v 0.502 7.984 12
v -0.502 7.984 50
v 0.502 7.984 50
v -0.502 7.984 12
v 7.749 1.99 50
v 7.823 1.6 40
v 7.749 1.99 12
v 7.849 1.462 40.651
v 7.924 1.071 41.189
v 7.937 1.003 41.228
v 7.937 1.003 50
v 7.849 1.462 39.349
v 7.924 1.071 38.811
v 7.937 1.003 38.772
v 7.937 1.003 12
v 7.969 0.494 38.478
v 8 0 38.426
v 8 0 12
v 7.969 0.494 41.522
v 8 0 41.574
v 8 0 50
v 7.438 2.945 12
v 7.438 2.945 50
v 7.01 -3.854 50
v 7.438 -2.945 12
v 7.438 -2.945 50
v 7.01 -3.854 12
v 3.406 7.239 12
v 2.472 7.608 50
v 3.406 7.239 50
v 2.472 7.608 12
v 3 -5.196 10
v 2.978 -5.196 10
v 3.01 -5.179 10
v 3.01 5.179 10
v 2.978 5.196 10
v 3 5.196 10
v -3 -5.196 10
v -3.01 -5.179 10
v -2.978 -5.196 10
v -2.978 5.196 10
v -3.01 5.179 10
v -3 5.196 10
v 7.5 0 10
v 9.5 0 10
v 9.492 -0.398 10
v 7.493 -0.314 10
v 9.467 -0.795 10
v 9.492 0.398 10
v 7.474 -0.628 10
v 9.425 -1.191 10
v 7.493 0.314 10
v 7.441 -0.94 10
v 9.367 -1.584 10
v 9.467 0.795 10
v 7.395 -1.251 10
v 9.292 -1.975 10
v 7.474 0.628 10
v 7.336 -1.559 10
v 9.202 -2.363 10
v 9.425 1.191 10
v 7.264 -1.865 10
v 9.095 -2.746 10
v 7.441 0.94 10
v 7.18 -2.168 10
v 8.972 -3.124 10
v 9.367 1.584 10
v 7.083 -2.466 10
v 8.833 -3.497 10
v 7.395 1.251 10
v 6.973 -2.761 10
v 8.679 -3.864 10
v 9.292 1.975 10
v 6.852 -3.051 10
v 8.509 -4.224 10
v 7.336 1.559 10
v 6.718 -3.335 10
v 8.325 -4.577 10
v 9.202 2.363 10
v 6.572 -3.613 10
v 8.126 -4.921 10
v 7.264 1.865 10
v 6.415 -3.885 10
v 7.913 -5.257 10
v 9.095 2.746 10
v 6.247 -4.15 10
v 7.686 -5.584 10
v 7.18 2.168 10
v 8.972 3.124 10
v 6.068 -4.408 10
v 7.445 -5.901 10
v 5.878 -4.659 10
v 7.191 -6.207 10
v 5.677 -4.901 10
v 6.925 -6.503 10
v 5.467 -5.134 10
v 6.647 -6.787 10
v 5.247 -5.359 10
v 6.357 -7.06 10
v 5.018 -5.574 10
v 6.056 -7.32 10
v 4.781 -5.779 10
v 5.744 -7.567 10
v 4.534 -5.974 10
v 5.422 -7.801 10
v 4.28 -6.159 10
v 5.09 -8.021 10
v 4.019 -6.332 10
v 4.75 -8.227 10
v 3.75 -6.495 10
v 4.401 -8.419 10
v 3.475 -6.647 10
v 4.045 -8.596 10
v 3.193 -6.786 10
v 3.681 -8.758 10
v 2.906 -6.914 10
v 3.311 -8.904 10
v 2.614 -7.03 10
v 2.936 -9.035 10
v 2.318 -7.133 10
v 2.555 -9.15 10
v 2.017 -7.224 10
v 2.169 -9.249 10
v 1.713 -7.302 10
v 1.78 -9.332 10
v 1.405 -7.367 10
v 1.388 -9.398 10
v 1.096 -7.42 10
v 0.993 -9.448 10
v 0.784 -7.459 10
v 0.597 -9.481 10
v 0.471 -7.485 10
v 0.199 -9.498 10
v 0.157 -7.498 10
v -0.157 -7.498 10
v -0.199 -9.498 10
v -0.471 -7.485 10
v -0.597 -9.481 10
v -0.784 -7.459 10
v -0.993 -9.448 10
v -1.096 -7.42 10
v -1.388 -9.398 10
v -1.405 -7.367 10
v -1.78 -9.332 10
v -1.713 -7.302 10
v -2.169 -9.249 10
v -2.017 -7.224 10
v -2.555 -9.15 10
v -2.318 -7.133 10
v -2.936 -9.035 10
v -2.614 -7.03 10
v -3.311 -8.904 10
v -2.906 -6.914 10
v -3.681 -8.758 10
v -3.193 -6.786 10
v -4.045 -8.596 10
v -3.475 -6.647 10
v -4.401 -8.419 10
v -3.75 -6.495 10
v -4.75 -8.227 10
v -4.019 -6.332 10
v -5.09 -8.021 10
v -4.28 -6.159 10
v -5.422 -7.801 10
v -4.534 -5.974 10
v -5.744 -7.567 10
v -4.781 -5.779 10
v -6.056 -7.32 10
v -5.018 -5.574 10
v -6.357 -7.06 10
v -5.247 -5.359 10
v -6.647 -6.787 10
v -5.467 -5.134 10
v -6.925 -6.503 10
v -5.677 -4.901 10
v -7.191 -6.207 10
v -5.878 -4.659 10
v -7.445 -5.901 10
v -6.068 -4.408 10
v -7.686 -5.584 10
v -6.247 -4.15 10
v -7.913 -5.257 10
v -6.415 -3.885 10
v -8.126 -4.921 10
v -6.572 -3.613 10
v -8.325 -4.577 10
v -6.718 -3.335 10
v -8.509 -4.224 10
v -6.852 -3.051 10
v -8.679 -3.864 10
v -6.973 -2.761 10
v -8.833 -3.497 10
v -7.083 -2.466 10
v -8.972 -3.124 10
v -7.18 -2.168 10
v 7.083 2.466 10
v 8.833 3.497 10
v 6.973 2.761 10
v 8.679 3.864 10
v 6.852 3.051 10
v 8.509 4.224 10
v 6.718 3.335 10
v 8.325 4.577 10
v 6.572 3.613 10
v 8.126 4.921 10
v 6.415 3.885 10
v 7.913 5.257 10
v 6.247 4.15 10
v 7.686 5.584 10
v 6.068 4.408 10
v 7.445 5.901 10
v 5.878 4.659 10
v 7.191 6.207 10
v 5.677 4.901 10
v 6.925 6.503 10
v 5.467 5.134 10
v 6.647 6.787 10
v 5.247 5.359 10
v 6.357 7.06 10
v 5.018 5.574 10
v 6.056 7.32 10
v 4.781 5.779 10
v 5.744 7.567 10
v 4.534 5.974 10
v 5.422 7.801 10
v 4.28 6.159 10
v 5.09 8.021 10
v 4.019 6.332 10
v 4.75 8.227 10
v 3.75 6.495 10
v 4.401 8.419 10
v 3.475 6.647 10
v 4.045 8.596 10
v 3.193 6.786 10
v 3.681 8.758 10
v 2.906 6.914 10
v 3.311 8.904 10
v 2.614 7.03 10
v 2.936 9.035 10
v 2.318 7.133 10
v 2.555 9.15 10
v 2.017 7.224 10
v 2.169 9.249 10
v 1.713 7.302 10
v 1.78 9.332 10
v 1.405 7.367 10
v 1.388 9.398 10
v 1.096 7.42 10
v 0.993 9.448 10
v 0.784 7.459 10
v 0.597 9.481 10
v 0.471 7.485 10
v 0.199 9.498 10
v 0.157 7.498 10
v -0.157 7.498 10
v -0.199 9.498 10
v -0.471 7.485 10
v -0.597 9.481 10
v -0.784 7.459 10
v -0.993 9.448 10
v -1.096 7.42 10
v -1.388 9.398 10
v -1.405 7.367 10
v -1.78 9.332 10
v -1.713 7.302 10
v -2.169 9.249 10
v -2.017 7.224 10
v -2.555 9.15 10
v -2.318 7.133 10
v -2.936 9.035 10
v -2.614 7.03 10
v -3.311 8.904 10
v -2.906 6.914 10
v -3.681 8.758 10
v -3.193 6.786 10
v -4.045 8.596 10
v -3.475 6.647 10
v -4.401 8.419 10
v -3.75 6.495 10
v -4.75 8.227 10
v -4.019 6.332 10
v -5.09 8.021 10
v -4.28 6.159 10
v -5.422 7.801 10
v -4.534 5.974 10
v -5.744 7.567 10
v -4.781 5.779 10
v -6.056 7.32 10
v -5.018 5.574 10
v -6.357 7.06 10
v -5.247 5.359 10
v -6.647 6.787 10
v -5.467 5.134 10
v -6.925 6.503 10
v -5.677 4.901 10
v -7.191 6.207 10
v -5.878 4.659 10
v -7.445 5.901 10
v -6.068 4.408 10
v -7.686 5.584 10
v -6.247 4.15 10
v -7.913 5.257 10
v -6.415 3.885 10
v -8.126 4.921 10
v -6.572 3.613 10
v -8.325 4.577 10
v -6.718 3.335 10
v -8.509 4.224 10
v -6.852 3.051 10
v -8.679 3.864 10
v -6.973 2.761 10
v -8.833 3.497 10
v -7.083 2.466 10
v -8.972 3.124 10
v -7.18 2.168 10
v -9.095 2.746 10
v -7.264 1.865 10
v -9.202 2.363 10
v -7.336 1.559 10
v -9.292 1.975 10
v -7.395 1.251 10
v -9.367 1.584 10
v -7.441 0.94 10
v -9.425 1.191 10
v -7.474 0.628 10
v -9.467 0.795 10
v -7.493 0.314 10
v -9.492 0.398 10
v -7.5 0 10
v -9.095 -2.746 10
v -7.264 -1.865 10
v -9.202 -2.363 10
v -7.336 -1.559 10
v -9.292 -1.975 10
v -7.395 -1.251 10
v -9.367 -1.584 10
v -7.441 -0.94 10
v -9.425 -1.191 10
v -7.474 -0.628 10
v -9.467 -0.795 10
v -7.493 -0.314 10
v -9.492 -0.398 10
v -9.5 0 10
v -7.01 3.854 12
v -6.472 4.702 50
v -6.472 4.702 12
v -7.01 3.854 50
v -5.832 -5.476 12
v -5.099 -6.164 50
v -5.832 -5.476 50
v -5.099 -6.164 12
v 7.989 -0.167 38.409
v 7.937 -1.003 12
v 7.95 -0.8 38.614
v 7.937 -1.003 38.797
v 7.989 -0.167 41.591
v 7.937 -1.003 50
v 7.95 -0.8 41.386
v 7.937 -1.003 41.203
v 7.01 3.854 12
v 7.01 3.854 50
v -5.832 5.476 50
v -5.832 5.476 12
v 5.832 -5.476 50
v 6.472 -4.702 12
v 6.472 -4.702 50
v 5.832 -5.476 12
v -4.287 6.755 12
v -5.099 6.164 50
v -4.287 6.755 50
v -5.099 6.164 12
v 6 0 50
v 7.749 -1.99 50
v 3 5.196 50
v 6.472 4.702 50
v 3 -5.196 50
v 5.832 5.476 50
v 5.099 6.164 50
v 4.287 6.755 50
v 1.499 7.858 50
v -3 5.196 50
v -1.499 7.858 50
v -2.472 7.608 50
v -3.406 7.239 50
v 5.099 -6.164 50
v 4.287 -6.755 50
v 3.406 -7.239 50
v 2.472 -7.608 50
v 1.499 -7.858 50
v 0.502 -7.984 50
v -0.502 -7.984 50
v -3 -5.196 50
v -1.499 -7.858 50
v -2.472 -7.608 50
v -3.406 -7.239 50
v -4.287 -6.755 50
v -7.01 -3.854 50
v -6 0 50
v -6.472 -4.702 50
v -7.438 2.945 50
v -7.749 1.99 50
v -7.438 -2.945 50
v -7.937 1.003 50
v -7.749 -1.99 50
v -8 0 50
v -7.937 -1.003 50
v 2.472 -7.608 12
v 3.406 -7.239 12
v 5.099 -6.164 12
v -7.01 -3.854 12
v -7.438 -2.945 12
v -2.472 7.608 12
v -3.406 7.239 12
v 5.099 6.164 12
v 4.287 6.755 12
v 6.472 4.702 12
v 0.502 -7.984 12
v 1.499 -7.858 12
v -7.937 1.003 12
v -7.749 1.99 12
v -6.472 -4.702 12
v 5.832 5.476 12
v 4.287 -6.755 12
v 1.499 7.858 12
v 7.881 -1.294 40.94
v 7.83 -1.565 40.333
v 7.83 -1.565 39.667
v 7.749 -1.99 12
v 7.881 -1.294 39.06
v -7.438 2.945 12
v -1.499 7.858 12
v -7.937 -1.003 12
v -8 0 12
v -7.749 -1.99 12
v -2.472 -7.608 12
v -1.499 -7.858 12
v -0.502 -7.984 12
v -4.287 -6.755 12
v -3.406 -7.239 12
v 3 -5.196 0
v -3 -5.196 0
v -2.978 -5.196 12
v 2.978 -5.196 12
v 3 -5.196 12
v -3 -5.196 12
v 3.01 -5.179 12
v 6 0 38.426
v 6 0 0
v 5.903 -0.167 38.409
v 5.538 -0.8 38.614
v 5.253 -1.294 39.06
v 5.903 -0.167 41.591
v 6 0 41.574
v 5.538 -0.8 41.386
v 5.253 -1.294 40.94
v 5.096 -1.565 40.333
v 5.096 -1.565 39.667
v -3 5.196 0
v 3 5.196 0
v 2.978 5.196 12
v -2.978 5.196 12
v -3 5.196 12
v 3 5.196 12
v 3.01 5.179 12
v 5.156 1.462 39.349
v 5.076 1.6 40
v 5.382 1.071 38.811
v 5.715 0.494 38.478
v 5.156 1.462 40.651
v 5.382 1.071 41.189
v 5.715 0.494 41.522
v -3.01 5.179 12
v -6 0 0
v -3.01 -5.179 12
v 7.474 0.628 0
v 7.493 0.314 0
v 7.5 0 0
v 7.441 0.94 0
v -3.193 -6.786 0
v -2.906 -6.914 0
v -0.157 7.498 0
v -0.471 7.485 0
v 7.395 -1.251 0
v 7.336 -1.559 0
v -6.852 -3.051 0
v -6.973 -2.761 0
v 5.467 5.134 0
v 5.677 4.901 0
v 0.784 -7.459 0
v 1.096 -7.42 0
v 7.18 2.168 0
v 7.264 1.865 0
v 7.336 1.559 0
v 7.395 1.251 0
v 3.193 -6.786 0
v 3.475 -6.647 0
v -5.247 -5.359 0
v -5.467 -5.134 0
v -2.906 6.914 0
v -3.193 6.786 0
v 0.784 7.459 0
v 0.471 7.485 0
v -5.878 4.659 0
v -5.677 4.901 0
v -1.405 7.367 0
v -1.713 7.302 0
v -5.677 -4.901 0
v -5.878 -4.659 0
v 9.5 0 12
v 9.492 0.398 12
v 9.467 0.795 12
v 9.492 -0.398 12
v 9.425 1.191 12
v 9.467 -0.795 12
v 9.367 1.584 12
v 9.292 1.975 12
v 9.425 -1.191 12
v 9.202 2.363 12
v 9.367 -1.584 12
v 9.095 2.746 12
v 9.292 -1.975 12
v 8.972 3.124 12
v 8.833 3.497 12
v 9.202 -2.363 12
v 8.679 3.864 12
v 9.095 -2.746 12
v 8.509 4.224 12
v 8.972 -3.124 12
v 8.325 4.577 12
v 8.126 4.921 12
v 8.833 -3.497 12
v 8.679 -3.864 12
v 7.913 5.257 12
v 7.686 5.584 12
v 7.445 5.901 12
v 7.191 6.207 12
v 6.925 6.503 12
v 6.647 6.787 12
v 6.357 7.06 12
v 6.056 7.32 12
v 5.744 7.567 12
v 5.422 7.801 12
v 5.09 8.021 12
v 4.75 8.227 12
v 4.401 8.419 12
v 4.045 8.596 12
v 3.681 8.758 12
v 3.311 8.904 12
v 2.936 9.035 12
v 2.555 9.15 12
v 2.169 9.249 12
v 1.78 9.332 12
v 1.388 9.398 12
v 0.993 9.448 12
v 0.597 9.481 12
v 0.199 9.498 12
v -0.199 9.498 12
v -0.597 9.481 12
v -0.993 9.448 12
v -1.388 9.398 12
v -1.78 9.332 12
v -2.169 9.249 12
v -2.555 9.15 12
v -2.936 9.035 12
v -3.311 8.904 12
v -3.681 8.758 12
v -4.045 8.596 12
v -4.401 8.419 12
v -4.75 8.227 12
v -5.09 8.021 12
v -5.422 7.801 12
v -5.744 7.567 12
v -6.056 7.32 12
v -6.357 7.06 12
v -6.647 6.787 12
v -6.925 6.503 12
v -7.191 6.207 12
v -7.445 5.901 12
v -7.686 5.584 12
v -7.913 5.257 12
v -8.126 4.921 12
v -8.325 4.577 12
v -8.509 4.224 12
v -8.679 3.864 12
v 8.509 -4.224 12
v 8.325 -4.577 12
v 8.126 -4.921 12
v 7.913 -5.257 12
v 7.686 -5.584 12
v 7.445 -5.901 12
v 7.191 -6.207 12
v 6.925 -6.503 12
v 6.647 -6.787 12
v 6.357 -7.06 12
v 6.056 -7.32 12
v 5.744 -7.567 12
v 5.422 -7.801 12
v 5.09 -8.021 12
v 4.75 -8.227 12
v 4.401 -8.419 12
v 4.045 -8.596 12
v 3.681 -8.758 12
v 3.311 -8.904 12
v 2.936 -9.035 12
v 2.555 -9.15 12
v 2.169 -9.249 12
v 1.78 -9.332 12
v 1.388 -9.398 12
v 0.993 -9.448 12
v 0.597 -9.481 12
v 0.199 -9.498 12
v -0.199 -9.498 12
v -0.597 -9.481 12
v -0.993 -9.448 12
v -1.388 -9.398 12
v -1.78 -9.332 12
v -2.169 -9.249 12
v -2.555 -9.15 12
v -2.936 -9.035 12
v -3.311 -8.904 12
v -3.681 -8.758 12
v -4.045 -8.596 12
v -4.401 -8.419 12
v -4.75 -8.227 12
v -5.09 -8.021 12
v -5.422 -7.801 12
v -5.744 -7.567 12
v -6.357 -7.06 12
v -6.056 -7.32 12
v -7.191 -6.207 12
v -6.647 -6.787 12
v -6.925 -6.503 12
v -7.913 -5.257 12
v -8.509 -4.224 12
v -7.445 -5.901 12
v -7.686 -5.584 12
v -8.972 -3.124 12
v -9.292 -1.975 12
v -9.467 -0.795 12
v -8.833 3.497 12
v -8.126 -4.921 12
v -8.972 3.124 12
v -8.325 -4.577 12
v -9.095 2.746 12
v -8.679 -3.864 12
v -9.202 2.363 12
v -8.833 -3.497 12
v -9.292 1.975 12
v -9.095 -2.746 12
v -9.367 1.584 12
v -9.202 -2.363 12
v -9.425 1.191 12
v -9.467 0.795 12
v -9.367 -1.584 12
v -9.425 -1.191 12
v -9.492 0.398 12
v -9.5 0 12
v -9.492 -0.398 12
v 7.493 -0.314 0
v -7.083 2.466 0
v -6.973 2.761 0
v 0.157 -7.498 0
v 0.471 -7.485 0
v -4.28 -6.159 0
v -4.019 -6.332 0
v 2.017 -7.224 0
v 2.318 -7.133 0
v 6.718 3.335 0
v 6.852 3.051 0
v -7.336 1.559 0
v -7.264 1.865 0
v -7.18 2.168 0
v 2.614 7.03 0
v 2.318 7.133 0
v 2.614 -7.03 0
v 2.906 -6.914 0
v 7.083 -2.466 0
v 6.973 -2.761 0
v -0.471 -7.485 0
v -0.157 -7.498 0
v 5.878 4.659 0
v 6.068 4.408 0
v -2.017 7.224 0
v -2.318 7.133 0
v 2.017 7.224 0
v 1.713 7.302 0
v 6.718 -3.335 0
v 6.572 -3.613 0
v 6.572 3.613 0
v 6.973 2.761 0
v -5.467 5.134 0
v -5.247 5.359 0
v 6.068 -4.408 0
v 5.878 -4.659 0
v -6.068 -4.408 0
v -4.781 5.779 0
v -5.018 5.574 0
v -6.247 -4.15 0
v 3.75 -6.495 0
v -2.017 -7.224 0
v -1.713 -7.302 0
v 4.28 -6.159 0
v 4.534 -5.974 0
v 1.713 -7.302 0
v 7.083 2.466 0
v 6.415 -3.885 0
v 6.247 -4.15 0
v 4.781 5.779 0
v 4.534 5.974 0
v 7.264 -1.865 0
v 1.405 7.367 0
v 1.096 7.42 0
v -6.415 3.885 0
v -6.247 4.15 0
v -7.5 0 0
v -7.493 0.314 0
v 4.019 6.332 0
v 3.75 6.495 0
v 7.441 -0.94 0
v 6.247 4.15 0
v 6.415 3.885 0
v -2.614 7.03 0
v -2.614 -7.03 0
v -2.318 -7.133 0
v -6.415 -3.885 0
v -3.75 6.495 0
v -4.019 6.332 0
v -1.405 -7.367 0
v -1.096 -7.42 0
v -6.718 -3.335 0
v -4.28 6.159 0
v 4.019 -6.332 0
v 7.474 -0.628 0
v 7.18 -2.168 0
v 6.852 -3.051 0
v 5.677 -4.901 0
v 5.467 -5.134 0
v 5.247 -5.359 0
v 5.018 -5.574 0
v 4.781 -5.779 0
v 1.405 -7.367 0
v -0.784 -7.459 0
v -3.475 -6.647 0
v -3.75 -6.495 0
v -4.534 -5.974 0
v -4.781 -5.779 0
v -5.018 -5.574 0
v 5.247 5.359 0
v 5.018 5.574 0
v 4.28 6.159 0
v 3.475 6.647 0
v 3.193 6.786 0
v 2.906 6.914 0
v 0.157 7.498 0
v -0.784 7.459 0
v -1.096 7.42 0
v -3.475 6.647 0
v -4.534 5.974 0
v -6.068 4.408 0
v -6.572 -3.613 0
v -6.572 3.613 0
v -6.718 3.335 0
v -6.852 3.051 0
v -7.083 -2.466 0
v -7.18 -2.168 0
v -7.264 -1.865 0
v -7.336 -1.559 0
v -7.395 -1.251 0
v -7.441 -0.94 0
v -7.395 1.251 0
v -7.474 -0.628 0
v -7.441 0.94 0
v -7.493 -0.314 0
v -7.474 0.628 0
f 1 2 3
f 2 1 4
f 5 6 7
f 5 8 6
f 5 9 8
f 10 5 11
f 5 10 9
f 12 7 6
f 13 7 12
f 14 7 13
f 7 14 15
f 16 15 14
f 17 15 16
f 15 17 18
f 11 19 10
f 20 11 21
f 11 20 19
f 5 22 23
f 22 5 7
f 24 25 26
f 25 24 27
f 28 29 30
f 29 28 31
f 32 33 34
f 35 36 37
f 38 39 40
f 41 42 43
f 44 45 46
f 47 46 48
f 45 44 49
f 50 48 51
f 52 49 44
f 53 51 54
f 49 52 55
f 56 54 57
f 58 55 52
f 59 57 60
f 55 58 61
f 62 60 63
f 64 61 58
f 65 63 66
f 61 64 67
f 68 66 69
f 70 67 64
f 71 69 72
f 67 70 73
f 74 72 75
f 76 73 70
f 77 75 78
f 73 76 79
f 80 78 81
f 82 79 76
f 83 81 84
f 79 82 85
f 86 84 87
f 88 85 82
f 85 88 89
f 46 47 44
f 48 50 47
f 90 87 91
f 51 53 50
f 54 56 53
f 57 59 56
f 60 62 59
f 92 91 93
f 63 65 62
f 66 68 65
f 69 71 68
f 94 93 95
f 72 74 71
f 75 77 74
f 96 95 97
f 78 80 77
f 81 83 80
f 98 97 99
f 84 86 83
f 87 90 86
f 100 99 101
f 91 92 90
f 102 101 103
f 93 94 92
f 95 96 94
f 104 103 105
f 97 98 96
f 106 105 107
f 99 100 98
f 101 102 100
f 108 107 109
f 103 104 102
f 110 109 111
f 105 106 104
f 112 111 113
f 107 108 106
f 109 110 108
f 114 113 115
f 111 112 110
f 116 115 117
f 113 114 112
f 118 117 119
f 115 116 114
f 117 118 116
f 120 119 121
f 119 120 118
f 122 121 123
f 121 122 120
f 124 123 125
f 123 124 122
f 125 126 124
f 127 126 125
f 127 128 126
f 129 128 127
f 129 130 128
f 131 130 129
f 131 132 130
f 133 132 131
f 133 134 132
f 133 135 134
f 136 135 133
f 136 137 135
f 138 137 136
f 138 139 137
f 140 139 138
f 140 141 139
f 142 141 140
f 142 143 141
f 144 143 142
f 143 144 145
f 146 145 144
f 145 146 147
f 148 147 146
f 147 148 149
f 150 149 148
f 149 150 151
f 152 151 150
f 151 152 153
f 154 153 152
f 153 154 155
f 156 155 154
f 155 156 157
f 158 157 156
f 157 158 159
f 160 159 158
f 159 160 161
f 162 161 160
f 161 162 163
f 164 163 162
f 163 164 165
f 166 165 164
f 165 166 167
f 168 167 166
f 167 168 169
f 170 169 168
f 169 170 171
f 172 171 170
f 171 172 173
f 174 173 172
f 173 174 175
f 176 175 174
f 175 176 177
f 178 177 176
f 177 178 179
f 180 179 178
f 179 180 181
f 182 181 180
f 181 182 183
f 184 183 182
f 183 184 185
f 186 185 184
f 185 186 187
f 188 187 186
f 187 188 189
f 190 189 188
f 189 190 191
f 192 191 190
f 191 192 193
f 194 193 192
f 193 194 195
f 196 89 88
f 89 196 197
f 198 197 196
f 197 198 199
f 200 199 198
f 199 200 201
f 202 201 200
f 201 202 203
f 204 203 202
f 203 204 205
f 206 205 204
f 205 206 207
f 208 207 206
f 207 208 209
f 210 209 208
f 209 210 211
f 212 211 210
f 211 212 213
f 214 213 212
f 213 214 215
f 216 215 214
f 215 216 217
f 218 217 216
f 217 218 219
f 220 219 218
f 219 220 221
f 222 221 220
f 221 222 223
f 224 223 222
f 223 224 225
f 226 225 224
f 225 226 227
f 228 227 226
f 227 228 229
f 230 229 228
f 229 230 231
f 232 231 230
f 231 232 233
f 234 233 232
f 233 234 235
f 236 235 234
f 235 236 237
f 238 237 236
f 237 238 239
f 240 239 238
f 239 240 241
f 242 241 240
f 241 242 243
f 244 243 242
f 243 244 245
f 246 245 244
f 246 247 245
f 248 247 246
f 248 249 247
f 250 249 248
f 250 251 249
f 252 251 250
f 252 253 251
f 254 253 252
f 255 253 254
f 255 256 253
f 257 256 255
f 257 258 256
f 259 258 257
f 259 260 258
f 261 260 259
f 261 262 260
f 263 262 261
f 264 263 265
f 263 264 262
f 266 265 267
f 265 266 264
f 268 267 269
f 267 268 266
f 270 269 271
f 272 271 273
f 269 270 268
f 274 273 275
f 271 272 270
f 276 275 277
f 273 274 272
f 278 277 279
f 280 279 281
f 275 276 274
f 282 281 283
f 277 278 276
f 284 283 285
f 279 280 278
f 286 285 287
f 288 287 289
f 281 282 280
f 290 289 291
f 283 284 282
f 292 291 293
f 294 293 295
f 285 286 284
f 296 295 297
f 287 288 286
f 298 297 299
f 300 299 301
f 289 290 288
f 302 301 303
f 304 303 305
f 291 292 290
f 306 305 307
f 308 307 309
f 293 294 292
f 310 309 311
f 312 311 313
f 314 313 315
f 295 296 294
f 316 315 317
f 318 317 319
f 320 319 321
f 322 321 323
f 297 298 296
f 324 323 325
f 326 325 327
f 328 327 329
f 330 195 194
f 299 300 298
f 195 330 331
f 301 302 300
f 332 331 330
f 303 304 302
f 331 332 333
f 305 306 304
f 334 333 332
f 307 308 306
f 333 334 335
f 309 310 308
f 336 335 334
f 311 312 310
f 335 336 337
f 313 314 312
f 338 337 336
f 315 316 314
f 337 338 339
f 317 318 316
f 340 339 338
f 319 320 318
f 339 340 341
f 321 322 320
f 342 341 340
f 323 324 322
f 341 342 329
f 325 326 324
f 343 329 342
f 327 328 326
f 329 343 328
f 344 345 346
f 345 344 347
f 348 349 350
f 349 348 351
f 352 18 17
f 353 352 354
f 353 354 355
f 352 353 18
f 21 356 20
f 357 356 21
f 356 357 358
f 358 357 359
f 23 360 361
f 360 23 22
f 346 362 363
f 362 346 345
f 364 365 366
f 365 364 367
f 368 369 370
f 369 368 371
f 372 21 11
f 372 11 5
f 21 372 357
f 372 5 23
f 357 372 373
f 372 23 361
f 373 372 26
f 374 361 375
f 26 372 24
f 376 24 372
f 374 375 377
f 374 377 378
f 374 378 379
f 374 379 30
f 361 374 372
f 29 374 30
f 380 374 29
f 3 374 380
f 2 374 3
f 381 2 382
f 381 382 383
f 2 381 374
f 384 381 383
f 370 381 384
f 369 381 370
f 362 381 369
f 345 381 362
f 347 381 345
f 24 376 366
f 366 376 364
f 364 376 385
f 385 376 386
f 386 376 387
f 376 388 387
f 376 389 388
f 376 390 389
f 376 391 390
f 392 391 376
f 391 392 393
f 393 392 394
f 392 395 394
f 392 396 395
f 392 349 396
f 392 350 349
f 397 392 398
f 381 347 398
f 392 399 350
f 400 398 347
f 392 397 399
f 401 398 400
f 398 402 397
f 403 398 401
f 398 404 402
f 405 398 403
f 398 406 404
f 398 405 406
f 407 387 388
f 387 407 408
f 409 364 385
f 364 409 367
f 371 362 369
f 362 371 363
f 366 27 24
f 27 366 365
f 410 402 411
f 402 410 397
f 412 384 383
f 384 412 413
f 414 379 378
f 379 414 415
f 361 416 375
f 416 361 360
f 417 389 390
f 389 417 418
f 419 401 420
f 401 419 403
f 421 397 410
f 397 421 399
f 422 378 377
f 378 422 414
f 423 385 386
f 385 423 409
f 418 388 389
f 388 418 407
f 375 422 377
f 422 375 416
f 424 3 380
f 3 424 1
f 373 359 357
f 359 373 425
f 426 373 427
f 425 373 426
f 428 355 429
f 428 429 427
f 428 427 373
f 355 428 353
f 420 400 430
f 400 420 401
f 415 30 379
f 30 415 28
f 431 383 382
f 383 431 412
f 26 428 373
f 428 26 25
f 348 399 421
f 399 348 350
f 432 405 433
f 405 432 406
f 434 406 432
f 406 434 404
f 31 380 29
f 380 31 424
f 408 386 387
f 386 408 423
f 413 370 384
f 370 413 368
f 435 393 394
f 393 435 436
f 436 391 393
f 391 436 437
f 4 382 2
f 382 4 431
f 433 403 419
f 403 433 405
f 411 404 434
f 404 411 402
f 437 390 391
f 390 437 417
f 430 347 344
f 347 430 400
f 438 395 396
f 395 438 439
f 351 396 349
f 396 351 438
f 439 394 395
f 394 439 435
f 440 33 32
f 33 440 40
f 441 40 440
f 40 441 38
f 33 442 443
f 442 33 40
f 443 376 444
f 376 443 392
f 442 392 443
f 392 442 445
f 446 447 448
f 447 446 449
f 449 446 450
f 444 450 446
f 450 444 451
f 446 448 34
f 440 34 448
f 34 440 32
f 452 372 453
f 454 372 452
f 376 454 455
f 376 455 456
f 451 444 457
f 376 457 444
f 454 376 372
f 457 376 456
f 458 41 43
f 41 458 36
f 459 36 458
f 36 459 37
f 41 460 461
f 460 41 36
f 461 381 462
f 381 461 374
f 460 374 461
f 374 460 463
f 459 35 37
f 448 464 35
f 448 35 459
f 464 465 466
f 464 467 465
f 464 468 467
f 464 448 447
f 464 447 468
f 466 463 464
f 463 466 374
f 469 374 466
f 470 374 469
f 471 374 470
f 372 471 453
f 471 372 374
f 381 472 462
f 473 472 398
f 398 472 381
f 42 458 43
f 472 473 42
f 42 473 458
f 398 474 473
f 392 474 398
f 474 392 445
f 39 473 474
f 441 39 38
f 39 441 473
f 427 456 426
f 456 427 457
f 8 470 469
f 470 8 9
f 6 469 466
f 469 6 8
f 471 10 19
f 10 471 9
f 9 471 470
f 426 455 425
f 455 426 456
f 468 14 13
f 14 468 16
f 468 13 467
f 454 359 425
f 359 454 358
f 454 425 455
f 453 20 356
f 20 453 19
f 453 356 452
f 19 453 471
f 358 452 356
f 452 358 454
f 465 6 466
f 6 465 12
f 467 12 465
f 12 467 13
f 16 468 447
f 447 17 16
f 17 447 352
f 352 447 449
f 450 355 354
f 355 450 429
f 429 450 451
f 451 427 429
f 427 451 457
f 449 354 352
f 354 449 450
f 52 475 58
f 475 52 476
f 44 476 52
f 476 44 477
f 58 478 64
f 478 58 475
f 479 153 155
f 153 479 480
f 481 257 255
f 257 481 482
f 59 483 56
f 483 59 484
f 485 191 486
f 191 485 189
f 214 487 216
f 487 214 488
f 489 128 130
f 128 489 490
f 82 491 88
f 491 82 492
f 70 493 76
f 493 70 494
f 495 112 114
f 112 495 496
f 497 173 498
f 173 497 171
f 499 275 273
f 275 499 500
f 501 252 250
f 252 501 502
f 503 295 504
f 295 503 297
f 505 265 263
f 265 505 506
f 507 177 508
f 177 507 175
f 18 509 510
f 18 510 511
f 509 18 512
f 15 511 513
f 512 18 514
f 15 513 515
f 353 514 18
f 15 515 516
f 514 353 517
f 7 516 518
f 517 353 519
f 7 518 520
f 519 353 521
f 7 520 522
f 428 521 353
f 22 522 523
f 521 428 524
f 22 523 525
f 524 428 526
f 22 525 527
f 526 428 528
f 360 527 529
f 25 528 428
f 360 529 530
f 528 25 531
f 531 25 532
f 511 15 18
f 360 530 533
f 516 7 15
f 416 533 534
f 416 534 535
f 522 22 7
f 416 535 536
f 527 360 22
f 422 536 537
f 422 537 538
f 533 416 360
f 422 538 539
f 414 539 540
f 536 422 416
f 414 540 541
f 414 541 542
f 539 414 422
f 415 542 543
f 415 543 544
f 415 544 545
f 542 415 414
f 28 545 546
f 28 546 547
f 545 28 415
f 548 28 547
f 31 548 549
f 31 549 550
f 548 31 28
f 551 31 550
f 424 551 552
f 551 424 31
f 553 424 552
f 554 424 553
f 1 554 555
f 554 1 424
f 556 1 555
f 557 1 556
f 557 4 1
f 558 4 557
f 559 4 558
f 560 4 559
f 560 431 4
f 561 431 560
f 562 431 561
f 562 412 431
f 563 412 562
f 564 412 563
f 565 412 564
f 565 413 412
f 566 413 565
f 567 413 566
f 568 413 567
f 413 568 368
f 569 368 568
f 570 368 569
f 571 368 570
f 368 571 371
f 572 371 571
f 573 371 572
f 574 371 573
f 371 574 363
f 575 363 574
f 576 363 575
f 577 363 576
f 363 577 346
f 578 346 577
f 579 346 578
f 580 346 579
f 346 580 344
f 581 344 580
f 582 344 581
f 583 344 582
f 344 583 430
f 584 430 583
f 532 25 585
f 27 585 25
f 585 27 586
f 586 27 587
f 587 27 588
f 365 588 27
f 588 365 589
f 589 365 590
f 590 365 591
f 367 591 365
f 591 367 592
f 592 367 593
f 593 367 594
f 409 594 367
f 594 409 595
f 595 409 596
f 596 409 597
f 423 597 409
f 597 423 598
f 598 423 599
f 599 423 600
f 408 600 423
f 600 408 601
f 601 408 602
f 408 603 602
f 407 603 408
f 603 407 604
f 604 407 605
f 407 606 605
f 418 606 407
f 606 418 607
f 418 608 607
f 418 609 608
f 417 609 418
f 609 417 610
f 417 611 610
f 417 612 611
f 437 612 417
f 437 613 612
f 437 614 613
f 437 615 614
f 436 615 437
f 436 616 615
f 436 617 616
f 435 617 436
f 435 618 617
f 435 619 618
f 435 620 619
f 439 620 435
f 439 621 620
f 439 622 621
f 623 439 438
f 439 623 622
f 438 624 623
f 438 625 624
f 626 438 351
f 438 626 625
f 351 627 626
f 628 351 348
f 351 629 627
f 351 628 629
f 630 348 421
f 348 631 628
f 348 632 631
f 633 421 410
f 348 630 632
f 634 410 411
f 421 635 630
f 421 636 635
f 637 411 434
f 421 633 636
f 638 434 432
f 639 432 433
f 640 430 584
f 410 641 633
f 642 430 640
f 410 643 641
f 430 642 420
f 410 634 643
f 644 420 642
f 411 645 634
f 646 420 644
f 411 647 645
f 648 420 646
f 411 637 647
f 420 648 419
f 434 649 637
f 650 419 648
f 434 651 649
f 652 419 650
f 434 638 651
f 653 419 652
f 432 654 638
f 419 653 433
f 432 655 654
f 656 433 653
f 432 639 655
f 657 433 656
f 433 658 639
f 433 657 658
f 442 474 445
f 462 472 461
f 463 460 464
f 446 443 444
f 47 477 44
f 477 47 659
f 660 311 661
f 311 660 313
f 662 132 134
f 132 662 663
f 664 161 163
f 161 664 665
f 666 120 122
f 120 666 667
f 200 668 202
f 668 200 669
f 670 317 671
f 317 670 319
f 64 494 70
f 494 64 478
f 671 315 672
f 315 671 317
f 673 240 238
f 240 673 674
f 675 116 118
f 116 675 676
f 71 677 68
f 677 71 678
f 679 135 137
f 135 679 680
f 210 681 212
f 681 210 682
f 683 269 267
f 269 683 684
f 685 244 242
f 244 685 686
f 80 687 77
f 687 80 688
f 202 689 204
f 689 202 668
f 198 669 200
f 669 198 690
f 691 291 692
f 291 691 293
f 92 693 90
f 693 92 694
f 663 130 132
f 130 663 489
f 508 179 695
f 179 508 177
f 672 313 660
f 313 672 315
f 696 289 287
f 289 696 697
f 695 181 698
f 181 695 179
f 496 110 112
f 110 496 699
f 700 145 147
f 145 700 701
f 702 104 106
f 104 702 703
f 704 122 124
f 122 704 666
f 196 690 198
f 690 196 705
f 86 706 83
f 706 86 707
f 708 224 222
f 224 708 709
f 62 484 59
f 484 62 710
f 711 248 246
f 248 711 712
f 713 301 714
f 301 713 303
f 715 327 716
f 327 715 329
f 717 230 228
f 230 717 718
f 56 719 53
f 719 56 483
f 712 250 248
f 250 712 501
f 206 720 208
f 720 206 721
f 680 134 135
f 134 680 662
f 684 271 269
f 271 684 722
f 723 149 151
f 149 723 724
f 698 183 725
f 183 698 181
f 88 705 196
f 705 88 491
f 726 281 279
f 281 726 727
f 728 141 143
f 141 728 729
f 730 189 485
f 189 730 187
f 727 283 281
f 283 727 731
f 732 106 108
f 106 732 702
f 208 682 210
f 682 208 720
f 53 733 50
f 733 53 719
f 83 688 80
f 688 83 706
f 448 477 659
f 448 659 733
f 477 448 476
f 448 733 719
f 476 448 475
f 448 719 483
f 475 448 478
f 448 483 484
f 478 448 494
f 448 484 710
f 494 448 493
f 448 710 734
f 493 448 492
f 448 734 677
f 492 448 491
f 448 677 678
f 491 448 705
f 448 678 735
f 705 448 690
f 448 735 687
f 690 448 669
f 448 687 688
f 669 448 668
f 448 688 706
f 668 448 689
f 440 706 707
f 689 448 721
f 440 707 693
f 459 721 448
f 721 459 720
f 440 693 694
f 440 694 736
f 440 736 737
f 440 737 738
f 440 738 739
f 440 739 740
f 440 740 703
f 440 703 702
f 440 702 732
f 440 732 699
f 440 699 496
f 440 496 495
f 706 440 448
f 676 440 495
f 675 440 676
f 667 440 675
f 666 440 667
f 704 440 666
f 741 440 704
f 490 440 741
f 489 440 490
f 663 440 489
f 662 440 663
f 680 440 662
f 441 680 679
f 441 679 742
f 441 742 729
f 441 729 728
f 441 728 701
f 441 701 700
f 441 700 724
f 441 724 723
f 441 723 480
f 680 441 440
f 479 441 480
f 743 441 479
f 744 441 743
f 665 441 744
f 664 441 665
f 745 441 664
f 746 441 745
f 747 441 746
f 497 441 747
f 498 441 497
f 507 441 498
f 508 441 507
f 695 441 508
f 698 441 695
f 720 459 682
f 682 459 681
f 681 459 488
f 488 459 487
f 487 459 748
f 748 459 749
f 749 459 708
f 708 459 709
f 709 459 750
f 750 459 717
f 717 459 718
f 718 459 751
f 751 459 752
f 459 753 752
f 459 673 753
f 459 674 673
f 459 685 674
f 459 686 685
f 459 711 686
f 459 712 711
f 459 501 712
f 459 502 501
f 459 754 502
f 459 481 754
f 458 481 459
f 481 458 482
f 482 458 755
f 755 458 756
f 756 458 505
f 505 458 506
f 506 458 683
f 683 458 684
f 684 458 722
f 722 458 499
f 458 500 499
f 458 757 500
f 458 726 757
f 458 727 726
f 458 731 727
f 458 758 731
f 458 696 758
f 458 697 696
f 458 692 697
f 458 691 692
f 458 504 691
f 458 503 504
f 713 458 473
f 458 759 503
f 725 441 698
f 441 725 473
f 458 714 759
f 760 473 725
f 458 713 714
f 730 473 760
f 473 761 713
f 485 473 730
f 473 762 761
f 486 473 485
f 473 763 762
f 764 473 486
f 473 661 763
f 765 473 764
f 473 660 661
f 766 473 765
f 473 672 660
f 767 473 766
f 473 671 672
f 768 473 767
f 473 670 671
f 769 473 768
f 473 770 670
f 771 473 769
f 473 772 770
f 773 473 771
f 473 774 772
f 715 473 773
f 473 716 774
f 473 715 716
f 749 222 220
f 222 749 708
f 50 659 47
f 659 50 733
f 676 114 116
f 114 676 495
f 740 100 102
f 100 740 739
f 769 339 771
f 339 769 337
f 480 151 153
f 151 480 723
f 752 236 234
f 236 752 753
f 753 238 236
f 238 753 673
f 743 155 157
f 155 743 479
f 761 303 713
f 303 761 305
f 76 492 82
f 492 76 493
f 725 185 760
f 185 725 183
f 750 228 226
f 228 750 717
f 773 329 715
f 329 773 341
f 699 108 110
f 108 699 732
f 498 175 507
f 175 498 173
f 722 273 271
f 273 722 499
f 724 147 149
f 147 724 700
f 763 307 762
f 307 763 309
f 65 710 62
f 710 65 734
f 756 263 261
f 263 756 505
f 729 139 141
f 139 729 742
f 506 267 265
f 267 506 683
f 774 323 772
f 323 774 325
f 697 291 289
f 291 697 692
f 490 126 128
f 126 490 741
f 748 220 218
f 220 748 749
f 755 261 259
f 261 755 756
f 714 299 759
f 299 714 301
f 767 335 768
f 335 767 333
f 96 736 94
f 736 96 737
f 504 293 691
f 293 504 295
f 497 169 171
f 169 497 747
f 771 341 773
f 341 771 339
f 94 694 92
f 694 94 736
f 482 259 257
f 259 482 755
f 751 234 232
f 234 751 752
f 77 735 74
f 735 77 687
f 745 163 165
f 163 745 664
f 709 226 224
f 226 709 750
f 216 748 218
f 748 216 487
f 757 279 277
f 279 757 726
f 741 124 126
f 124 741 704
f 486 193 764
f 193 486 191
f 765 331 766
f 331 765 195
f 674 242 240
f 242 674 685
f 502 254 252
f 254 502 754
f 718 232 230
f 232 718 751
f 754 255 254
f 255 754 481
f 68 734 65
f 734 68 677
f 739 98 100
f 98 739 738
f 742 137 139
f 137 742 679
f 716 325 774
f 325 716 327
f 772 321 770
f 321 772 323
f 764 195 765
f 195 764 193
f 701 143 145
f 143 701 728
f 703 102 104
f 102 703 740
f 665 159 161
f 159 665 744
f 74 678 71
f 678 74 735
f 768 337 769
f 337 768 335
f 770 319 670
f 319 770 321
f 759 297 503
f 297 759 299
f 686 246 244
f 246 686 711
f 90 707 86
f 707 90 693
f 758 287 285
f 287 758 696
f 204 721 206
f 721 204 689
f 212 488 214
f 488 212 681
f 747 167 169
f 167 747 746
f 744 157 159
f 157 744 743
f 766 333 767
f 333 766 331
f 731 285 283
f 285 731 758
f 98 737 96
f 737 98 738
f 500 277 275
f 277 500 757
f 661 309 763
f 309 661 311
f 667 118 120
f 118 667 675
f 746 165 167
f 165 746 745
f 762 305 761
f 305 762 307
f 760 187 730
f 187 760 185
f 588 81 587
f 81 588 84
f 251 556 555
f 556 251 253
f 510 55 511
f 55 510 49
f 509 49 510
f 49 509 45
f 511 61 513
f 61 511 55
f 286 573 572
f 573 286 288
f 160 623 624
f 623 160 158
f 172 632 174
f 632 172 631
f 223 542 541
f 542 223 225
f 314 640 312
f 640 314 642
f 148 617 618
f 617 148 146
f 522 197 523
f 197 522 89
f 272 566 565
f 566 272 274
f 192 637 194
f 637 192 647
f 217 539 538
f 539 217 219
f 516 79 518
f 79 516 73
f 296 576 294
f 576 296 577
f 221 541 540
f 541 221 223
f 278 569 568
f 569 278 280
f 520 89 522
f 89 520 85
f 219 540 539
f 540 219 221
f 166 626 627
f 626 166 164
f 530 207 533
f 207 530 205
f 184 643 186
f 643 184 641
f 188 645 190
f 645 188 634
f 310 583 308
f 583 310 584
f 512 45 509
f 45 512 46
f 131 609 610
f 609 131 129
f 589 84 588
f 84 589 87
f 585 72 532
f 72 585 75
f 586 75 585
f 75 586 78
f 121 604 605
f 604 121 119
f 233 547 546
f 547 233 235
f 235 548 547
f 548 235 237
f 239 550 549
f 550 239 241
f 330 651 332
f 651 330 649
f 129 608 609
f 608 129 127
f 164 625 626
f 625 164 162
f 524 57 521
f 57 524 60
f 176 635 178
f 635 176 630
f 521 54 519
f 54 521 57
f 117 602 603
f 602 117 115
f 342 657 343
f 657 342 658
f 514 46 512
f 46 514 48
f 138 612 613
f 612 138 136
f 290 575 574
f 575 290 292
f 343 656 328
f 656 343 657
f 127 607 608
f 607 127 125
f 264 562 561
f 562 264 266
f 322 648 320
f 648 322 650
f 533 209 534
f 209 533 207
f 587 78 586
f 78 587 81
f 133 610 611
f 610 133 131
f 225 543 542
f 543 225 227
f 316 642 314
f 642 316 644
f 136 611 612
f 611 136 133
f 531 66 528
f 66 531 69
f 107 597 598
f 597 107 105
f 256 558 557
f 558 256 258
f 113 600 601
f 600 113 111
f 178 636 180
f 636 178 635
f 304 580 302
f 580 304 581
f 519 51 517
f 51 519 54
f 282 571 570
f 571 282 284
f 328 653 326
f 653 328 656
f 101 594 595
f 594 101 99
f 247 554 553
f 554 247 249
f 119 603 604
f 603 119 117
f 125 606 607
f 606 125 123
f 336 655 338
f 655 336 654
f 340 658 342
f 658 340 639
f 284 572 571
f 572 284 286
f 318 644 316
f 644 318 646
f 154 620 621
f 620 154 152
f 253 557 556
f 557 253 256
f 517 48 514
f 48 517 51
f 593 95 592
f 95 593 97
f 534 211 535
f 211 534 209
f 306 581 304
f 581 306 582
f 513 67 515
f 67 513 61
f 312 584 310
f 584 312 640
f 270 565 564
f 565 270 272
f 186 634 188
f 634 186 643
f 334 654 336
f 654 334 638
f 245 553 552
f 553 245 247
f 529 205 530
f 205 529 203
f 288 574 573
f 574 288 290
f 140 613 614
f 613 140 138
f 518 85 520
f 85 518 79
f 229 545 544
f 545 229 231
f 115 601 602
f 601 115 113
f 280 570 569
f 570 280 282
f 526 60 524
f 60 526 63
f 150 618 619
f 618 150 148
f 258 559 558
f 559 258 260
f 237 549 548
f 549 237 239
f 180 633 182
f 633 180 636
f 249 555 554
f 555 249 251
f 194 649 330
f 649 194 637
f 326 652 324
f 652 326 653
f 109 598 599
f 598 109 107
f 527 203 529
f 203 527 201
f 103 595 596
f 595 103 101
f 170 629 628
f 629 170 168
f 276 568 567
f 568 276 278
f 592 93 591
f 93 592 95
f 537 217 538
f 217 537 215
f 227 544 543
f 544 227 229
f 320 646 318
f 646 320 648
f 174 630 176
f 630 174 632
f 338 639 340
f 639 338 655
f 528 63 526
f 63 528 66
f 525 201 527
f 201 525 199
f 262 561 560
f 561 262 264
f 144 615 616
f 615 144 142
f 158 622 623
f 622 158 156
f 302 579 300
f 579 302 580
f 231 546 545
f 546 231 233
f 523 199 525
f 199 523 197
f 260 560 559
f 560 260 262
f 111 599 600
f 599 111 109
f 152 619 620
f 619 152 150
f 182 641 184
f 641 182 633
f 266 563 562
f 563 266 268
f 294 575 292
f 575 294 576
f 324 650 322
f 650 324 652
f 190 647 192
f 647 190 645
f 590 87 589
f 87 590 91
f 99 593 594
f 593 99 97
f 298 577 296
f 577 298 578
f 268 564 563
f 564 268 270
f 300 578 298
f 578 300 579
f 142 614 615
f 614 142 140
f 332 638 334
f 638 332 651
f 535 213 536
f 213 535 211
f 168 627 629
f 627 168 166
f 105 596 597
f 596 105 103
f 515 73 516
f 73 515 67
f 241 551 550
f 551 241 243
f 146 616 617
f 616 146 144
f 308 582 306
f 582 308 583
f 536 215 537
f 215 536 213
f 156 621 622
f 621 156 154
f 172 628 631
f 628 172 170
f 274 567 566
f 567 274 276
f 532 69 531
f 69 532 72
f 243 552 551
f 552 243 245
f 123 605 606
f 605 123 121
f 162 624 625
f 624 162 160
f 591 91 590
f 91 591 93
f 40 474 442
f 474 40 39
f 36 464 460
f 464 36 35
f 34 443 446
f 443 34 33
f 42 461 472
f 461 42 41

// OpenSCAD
//Polargraph Gondola Parts
//Copyright Mark Benson 2016 CCNC 2016

//include <ISOThread.scad>
//include <ISOThreadUM2.scad>

module penHolderShaft()
{
    difference()
    {
        cylinder(r=16/2,40,$fn=50);
        cylinder(r=12/2,42,$fn=6);
    }
}


module penHolderShaftWithScrewHole()
{
    difference()
    {
        penHolderShaft();
    
        rotate([90,0,90])
        translate([0,30,0])
        cylinder(r=3.2/2, h=10, $fn=15);
    }
}

module penCollar()
{
    //push fit collar
    difference()
    {
        cylinder(r=15/2,12,$fn=150);
        #cylinder(r=12/2,12,$fn=6);
    }
    
    //push fit collar stop
    translate([0,0,10])
    difference()
    {
        cylinder(r=19/2,2,$fn=150);
        cylinder(r=12/2,2,$fn=50);
    }    


}   

//penCollar();

module penHolder()
{
    union()
    {
        translate([0,0,10])
        penHolderShaftWithScrewHole();
        penCollar();
    }
}

//translate([0,0,30])
//penHolder();

module gondola()
{
    difference()
    {
        //Stabilizing plate
        union()
        {
            difference()
            {
                cylinder(r=100/2,h=1.5,$fn=50);
                
                translate([0,0,-0.1])
                cylinder(r=90/2,h=2,$fn=50);
            }
            
            translate([0,0,0.75])
            cube([5,95,1.5], center=true);
            
            translate([0,0,0.75])
            cube([95,5,1.5], center=true);    
        }
        
        union()
        {
            cylinder(r=15/2,h=25,$fn=50);
        }
        
    }
    
    //Base collar
    difference()
    {
        cylinder(r=24/2,h=15,$fn=50);
        translate([0,0,0])
        cylinder(r=15/2,h=15,$fn=50);
        hull()
        {
            rotate([90,0,45])
            translate([0,0,-15])
            cylinder(r=6/2,h=30,$fn=50);
                
            rotate([90,0,45])
            translate([0,6,-15])
            cylinder(r=6/2,h=30,$fn=50);
        }
        hull()
        {
        rotate([90,0,135])
        translate([0,0,-15])
        cylinder(r=6/2,h=30,$fn=50);
        
        rotate([90,0,135])
        translate([0,6,-15])
        cylinder(r=6/2,h=30,$fn=50);
        }
    }
    
    //Arm pivot
    translate([0,0,15])
    difference()
    {
        cylinder(r=20/2,h=16,$fn=150);
        cylinder(r=15/2,h=16,$fn=50);
    }

    //translate([0,0,10+15])
    //penCollar();
    
    //Servo plate
    translate([21,-21,0])
    rotate([0,0,45])
    difference()
    {
        minkowski()
        {
            cylinder(d=3,h=0.5);
            translate([0,0,0.5])
            cube([30,30,1],center=true);
        }
        
            translate([0,10,0.5])
            cube([25,5,3],center=true);
    }
}

//Uncomment these to render each part
//gondola();

//translate([0,0,28])
penHolder();
